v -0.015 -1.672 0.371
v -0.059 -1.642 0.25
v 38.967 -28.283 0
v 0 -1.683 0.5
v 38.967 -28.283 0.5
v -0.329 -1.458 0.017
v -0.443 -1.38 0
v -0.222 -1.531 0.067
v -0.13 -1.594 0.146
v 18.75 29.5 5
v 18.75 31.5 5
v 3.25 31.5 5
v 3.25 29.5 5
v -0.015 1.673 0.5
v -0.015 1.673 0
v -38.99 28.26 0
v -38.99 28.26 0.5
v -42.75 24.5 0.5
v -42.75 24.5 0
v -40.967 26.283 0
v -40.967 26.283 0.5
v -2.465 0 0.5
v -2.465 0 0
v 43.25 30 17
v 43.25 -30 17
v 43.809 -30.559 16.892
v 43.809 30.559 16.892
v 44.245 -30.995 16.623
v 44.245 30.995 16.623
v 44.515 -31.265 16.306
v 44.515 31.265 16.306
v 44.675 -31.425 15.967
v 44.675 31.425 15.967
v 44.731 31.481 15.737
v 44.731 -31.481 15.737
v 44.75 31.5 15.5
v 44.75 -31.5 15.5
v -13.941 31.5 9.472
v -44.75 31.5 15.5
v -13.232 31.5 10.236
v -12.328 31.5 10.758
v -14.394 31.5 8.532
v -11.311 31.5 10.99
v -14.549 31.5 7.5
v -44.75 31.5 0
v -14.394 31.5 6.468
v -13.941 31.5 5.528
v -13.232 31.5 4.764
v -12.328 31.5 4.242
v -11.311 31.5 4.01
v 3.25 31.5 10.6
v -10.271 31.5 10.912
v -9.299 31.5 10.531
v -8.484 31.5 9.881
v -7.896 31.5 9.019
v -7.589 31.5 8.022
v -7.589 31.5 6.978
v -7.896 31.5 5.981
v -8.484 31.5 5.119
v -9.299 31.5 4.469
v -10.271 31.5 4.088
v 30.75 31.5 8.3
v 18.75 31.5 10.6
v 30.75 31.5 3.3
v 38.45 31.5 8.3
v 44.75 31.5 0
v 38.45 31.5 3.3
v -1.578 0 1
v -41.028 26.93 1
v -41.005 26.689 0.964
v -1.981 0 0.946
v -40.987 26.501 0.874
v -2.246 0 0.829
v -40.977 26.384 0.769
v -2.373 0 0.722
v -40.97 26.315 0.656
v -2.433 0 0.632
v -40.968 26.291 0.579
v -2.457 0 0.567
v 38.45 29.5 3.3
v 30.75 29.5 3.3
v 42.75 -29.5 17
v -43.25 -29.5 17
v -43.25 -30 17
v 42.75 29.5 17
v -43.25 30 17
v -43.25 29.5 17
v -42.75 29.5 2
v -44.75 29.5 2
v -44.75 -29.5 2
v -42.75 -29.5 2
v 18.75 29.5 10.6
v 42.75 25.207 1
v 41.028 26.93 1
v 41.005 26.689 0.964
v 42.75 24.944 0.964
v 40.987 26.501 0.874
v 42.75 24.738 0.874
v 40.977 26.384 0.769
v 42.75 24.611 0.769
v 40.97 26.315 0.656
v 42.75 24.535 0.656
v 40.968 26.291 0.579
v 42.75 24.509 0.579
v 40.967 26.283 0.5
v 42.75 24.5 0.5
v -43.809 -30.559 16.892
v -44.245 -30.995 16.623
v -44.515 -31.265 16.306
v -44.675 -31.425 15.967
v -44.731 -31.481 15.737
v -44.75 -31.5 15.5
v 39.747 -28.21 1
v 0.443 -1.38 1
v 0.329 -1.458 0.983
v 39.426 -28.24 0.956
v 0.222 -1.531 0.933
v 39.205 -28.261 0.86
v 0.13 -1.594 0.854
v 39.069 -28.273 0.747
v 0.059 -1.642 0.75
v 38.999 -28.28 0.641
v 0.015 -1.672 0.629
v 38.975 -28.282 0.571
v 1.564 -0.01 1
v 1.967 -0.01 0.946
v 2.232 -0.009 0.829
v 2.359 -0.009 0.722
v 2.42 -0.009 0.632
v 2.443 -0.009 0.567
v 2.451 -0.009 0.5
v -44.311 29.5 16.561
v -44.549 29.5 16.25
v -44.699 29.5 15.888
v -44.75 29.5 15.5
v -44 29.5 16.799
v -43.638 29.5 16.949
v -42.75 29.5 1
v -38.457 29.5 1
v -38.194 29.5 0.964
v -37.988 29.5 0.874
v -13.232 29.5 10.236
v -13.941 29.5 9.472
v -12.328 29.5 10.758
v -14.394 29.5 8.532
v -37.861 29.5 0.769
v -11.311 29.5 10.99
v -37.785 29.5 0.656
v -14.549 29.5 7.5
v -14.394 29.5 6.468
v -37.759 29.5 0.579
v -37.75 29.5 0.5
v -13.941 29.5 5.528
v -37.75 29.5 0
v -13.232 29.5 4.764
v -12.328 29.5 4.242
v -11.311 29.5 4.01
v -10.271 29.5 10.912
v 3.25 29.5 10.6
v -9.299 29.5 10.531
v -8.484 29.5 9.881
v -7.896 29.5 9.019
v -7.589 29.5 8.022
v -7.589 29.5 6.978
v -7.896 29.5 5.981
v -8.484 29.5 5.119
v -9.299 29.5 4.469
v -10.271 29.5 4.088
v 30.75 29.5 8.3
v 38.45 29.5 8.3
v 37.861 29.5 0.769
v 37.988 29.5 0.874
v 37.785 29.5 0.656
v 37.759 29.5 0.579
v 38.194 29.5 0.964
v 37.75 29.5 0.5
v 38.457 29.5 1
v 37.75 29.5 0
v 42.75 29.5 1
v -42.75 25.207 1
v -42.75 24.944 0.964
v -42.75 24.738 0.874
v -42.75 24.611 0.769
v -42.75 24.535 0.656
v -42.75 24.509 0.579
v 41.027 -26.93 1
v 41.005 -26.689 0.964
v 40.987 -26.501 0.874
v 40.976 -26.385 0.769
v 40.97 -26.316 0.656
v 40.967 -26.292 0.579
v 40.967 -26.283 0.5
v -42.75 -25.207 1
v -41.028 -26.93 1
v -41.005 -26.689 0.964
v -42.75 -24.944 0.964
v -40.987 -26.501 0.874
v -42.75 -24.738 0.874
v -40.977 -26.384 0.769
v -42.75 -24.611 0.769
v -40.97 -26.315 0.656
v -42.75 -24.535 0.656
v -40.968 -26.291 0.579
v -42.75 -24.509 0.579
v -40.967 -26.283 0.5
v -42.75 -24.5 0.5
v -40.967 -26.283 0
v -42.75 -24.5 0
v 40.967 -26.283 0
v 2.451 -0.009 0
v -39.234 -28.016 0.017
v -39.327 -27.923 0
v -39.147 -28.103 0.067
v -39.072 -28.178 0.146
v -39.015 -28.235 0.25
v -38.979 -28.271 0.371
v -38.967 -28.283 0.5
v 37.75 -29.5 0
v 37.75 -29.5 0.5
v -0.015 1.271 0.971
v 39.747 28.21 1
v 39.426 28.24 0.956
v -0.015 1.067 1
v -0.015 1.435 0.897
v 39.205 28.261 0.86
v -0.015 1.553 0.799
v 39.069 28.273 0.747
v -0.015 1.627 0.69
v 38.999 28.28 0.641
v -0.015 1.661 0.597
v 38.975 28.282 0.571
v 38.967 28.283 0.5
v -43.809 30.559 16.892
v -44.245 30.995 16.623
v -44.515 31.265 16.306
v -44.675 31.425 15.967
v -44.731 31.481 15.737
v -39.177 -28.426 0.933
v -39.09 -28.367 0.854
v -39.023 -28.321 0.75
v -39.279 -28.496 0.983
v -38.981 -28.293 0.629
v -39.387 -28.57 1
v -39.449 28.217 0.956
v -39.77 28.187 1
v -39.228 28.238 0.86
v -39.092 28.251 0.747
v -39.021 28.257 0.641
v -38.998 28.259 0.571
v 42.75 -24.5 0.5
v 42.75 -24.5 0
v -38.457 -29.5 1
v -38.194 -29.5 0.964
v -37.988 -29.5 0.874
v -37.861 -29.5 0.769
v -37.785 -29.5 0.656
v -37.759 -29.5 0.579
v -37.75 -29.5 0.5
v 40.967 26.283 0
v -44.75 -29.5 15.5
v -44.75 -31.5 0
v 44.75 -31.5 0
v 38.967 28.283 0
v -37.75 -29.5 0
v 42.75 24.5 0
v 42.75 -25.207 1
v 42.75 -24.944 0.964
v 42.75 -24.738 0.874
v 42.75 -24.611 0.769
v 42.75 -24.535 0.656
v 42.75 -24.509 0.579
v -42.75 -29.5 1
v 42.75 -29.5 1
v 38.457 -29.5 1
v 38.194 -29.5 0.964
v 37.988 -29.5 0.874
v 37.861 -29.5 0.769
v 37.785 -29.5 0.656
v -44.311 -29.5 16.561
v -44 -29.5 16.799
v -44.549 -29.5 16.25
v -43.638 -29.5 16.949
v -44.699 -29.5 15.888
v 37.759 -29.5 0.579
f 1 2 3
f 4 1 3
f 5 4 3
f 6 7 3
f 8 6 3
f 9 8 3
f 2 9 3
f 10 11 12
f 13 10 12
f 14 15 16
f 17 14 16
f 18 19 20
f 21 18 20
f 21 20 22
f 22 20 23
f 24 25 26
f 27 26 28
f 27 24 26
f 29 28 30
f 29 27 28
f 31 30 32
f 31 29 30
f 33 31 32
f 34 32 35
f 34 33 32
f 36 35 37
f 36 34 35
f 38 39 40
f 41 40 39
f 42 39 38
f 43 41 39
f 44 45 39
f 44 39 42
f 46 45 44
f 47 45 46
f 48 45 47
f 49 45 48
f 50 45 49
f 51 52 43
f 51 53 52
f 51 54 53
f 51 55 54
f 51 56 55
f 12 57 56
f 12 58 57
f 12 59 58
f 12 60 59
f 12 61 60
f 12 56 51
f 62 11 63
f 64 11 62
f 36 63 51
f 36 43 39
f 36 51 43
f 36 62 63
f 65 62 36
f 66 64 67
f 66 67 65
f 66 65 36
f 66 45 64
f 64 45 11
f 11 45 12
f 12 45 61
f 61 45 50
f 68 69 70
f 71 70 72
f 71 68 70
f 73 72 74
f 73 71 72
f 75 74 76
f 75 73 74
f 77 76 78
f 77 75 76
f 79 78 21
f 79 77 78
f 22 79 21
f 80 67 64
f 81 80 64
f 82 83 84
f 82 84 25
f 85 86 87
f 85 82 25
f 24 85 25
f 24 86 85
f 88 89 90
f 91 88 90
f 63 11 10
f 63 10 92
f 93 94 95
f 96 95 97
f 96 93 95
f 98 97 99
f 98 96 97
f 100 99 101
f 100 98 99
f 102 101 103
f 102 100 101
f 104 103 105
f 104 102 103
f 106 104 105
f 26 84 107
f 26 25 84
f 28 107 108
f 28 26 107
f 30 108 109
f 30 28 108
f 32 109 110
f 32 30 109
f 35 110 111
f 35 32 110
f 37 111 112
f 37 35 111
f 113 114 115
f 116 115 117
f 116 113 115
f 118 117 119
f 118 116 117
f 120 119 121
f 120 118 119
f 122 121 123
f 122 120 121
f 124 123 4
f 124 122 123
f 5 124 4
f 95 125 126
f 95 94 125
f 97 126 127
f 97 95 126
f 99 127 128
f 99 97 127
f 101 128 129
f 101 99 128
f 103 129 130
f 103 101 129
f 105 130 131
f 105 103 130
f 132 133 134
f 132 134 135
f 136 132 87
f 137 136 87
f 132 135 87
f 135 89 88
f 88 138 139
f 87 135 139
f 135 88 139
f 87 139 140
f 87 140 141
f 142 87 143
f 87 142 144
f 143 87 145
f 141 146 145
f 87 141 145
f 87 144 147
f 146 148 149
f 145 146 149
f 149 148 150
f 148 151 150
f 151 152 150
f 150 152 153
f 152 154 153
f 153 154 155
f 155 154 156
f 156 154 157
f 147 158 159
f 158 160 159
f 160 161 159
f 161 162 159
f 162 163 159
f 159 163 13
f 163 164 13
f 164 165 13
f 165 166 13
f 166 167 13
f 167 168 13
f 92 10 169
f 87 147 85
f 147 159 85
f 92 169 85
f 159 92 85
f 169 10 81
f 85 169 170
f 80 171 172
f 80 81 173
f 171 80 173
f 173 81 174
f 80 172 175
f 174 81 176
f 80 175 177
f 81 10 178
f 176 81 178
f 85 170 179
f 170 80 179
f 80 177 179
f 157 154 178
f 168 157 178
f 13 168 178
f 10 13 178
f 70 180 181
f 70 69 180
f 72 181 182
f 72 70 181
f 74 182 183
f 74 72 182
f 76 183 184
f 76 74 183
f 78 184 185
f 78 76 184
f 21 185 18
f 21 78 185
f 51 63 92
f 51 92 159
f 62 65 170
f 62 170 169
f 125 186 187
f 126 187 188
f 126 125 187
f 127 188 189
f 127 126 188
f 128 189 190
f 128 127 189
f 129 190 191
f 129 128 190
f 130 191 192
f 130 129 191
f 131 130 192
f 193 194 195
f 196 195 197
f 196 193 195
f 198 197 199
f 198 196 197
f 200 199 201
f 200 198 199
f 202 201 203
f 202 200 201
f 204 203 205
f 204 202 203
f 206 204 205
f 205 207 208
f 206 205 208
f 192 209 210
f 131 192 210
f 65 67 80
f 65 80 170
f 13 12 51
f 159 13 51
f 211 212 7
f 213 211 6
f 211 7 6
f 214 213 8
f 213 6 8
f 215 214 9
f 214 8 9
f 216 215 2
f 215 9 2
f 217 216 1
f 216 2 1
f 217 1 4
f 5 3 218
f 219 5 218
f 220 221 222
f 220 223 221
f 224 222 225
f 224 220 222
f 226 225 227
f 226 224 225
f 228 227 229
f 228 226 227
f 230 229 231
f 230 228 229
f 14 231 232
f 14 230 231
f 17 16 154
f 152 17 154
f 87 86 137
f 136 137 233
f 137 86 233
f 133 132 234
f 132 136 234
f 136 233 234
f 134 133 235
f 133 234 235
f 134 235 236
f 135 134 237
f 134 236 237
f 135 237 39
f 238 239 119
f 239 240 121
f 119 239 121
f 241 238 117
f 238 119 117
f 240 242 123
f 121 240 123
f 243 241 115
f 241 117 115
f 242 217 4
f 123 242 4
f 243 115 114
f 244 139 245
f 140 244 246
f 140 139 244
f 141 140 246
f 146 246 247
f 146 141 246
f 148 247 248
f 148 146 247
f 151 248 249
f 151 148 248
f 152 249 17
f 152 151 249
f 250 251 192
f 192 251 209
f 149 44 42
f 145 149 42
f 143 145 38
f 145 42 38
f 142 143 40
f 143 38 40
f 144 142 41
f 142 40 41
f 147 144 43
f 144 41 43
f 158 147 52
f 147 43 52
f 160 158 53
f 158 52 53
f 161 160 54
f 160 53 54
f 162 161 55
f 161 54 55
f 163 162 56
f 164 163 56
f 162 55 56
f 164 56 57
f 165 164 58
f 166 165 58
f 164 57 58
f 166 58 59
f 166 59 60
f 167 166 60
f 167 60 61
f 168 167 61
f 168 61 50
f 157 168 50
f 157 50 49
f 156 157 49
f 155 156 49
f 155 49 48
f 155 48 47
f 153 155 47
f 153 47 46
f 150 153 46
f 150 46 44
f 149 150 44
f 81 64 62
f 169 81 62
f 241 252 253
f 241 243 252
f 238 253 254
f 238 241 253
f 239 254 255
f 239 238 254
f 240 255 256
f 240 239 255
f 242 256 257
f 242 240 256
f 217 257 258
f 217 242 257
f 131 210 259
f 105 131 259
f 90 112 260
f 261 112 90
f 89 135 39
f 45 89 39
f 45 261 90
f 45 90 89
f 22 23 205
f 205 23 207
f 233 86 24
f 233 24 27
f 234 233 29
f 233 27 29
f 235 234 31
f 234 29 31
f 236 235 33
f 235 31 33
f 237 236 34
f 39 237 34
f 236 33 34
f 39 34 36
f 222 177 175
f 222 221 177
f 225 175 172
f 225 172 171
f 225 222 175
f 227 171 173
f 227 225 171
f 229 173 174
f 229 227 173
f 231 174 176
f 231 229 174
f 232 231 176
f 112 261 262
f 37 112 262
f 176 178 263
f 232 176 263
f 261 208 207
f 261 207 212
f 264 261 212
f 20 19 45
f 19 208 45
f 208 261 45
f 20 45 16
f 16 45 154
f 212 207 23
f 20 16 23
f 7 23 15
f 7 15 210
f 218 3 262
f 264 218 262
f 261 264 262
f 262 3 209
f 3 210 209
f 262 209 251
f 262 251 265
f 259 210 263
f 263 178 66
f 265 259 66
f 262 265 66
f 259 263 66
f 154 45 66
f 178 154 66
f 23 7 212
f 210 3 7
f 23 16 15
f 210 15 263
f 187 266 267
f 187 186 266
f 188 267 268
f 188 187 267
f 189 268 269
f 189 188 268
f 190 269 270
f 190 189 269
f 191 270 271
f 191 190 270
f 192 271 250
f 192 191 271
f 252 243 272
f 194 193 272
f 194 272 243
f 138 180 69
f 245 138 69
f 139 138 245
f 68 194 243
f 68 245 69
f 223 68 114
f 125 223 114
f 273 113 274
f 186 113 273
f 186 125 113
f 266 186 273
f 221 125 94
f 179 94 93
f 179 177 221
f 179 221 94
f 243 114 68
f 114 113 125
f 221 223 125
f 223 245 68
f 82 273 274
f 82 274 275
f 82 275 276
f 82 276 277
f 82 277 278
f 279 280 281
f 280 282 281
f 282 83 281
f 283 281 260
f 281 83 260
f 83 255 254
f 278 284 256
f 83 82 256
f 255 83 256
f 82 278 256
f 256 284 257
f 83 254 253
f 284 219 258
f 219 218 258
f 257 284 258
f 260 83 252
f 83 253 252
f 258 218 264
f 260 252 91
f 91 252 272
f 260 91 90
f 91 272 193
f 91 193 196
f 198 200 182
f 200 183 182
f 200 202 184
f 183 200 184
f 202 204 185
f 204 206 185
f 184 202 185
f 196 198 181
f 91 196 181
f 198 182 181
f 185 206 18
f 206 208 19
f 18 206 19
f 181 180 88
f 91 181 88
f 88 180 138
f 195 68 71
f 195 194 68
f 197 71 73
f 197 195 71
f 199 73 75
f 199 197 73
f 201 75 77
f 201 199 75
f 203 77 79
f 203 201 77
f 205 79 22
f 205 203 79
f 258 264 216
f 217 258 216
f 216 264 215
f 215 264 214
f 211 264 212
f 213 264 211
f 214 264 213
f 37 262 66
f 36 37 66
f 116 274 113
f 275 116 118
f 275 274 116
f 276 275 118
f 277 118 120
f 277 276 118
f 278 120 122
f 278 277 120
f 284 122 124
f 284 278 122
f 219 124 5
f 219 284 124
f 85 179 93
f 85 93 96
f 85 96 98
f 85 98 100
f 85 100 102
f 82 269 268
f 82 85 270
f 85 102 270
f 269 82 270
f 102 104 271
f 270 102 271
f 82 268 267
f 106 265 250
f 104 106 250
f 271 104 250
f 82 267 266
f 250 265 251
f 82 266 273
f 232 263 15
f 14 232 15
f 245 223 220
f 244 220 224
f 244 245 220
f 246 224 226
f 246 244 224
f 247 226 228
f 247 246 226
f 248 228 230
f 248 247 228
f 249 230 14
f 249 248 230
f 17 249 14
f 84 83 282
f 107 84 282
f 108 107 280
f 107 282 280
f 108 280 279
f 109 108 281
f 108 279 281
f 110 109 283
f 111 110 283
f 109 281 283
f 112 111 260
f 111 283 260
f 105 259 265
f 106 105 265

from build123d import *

# Parameters (mm, degrees)
F0_W     = 89.5
F0_H     = 63
F1_DEPTH = 17
F2_DEPTH = 1
F3_R     = 1.5
F4_R     = 0.49999
F5_W     = 7.7
F5_H     = 5
F5_W_2   = 15.5
F5_H_2   = 5.6
F5_R     = 3.5
F6_DEPTH = 25
F7_W     = 59
F7_H     = 13.5
F7_H_2   = 3.5
F8_DEPTH = 25


# Not quite as in the source:
# - a fillet or chamfer is up to 0.001 mm smaller than in the source, because OpenCascade refuses the exact size


with BuildPart() as f1:
    # F0 (on Top) → F1 (new body)
    with BuildSketch(Plane.XY):
        Rectangle(F0_W, F0_H)
        Polygon((-42.75, 24.5), (-42.75, 29.5), (-37.75, 29.5), (37.75, 29.5), (42.75, 29.5), (42.75, 24.5), (42.75, -24.5), (42.75, -29.5), (37.75, -29.5), (-37.75, -29.5), (-42.75, -29.5), (-42.75, -24.5), align=None, mode=Mode.SUBTRACT)
    extrude(amount=F1_DEPTH)

    # F0 (on Top) → F2 (join)
    with BuildSketch(Plane.XY):
        Polygon((-0.0146734692, 1.6726181109), (-38.9898385852, 28.2601614148), (-40.9670818505, 26.2829181495), (-2.4649122807, 0), (-40.9670818505, -26.2829181495), (-38.9670818505, -28.2829181495), (0, -1.6826347305), (38.9670818505, -28.2829181495), (40.96658534, -26.28341466), (2.4510848657, -0.0094390737), (40.9670818505, 26.2829181495), (38.9670818505, 28.2829181495), align=None)
        Polygon((-37.75, 29.5), (-42.75, 29.5), (-42.75, 24.5), (-40.9670818505, 26.2829181495), (-38.9898385852, 28.2601614148), align=None)
        Polygon((42.75, 29.5), (37.75, 29.5), (38.9670818505, 28.2829181495), (40.9670818505, 26.2829181495), (42.75, 24.5), align=None)
        Polygon((42.75, -29.5), (42.75, -24.5), (40.96658534, -26.28341466), (38.9670818505, -28.2829181495), (37.75, -29.5), align=None)
        Polygon((-40.9670818505, -26.2829181495), (-42.75, -24.5), (-42.75, -29.5), (-37.75, -29.5), (-38.9670818505, -28.2829181495), align=None)
    extrude(amount=F2_DEPTH)

    # F3
    f3_edges = [f1.edges().sort_by_distance(p)[0] for p in [
        (0, 31.5, 17),
        (-44.75, 0, 17),
        (0, -31.5, 17),
        (44.75, 0, 17),
    ]]
    fillet(f3_edges, radius=F3_R)

    # F4 (radius 0.5 in the source; OpenCascade refuses exactly that, so slightly less here)
    f4_edges = [f1.edges().sort_by_distance(p)[0] for p in [
        (-19.502256, 14.96639, 1),
        (-21.715997, 13.141459, 1),
        (19.476204, 14.977768, 1),
        (21.709083, 13.13674, 1),
        (-21.715997, -13.141459, 1),
        (-19.483541, -14.982776, 0),
        (19.483541, -14.982776, 1),
        (21.708835, -13.146427, 1),
        (-41.858541, 25.391459, 1),
        (-38.369919, 28.880081, 1),
        (41.858541, 25.391459, 1),
        (38.358541, 28.891459, 1),
        (-41.858541, -25.391459, 1),
        (-38.358541, -28.891459, 1),
        (41.858293, -25.391707, 1),
        (38.358541, -28.891459, 1),
    ]]
    fillet(f4_edges, radius=F4_R)

    # F5 (on face) → F6 (cut)
    with BuildSketch(Plane(origin=(0, 31.5, 0), x_dir=(-1, 0, 0), z_dir=(0, 1, 0))):
        with Locations((-34.6, 5.8)):
            Rectangle(F5_W, F5_H)
        with Locations((-11, 7.8)):
            Rectangle(F5_W_2, F5_H_2)
        with Locations((11.0494399613, 7.5)):
            Circle(F5_R)
    extrude(amount=-F6_DEPTH, mode=Mode.SUBTRACT)

    # F7 (on face) → F8 (cut)
    with BuildSketch(Plane(origin=(-44.75, 0, 0), x_dir=(0, -1, 0), z_dir=(-1, 0, 0))):
        with Locations((0, 8.75)):
            Rectangle(F7_W, F7_H)
        with Locations((0, 17.25)):
            Rectangle(F7_W, F7_H_2)
    extrude(amount=-F8_DEPTH, mode=Mode.SUBTRACT)


solid = f1.part
